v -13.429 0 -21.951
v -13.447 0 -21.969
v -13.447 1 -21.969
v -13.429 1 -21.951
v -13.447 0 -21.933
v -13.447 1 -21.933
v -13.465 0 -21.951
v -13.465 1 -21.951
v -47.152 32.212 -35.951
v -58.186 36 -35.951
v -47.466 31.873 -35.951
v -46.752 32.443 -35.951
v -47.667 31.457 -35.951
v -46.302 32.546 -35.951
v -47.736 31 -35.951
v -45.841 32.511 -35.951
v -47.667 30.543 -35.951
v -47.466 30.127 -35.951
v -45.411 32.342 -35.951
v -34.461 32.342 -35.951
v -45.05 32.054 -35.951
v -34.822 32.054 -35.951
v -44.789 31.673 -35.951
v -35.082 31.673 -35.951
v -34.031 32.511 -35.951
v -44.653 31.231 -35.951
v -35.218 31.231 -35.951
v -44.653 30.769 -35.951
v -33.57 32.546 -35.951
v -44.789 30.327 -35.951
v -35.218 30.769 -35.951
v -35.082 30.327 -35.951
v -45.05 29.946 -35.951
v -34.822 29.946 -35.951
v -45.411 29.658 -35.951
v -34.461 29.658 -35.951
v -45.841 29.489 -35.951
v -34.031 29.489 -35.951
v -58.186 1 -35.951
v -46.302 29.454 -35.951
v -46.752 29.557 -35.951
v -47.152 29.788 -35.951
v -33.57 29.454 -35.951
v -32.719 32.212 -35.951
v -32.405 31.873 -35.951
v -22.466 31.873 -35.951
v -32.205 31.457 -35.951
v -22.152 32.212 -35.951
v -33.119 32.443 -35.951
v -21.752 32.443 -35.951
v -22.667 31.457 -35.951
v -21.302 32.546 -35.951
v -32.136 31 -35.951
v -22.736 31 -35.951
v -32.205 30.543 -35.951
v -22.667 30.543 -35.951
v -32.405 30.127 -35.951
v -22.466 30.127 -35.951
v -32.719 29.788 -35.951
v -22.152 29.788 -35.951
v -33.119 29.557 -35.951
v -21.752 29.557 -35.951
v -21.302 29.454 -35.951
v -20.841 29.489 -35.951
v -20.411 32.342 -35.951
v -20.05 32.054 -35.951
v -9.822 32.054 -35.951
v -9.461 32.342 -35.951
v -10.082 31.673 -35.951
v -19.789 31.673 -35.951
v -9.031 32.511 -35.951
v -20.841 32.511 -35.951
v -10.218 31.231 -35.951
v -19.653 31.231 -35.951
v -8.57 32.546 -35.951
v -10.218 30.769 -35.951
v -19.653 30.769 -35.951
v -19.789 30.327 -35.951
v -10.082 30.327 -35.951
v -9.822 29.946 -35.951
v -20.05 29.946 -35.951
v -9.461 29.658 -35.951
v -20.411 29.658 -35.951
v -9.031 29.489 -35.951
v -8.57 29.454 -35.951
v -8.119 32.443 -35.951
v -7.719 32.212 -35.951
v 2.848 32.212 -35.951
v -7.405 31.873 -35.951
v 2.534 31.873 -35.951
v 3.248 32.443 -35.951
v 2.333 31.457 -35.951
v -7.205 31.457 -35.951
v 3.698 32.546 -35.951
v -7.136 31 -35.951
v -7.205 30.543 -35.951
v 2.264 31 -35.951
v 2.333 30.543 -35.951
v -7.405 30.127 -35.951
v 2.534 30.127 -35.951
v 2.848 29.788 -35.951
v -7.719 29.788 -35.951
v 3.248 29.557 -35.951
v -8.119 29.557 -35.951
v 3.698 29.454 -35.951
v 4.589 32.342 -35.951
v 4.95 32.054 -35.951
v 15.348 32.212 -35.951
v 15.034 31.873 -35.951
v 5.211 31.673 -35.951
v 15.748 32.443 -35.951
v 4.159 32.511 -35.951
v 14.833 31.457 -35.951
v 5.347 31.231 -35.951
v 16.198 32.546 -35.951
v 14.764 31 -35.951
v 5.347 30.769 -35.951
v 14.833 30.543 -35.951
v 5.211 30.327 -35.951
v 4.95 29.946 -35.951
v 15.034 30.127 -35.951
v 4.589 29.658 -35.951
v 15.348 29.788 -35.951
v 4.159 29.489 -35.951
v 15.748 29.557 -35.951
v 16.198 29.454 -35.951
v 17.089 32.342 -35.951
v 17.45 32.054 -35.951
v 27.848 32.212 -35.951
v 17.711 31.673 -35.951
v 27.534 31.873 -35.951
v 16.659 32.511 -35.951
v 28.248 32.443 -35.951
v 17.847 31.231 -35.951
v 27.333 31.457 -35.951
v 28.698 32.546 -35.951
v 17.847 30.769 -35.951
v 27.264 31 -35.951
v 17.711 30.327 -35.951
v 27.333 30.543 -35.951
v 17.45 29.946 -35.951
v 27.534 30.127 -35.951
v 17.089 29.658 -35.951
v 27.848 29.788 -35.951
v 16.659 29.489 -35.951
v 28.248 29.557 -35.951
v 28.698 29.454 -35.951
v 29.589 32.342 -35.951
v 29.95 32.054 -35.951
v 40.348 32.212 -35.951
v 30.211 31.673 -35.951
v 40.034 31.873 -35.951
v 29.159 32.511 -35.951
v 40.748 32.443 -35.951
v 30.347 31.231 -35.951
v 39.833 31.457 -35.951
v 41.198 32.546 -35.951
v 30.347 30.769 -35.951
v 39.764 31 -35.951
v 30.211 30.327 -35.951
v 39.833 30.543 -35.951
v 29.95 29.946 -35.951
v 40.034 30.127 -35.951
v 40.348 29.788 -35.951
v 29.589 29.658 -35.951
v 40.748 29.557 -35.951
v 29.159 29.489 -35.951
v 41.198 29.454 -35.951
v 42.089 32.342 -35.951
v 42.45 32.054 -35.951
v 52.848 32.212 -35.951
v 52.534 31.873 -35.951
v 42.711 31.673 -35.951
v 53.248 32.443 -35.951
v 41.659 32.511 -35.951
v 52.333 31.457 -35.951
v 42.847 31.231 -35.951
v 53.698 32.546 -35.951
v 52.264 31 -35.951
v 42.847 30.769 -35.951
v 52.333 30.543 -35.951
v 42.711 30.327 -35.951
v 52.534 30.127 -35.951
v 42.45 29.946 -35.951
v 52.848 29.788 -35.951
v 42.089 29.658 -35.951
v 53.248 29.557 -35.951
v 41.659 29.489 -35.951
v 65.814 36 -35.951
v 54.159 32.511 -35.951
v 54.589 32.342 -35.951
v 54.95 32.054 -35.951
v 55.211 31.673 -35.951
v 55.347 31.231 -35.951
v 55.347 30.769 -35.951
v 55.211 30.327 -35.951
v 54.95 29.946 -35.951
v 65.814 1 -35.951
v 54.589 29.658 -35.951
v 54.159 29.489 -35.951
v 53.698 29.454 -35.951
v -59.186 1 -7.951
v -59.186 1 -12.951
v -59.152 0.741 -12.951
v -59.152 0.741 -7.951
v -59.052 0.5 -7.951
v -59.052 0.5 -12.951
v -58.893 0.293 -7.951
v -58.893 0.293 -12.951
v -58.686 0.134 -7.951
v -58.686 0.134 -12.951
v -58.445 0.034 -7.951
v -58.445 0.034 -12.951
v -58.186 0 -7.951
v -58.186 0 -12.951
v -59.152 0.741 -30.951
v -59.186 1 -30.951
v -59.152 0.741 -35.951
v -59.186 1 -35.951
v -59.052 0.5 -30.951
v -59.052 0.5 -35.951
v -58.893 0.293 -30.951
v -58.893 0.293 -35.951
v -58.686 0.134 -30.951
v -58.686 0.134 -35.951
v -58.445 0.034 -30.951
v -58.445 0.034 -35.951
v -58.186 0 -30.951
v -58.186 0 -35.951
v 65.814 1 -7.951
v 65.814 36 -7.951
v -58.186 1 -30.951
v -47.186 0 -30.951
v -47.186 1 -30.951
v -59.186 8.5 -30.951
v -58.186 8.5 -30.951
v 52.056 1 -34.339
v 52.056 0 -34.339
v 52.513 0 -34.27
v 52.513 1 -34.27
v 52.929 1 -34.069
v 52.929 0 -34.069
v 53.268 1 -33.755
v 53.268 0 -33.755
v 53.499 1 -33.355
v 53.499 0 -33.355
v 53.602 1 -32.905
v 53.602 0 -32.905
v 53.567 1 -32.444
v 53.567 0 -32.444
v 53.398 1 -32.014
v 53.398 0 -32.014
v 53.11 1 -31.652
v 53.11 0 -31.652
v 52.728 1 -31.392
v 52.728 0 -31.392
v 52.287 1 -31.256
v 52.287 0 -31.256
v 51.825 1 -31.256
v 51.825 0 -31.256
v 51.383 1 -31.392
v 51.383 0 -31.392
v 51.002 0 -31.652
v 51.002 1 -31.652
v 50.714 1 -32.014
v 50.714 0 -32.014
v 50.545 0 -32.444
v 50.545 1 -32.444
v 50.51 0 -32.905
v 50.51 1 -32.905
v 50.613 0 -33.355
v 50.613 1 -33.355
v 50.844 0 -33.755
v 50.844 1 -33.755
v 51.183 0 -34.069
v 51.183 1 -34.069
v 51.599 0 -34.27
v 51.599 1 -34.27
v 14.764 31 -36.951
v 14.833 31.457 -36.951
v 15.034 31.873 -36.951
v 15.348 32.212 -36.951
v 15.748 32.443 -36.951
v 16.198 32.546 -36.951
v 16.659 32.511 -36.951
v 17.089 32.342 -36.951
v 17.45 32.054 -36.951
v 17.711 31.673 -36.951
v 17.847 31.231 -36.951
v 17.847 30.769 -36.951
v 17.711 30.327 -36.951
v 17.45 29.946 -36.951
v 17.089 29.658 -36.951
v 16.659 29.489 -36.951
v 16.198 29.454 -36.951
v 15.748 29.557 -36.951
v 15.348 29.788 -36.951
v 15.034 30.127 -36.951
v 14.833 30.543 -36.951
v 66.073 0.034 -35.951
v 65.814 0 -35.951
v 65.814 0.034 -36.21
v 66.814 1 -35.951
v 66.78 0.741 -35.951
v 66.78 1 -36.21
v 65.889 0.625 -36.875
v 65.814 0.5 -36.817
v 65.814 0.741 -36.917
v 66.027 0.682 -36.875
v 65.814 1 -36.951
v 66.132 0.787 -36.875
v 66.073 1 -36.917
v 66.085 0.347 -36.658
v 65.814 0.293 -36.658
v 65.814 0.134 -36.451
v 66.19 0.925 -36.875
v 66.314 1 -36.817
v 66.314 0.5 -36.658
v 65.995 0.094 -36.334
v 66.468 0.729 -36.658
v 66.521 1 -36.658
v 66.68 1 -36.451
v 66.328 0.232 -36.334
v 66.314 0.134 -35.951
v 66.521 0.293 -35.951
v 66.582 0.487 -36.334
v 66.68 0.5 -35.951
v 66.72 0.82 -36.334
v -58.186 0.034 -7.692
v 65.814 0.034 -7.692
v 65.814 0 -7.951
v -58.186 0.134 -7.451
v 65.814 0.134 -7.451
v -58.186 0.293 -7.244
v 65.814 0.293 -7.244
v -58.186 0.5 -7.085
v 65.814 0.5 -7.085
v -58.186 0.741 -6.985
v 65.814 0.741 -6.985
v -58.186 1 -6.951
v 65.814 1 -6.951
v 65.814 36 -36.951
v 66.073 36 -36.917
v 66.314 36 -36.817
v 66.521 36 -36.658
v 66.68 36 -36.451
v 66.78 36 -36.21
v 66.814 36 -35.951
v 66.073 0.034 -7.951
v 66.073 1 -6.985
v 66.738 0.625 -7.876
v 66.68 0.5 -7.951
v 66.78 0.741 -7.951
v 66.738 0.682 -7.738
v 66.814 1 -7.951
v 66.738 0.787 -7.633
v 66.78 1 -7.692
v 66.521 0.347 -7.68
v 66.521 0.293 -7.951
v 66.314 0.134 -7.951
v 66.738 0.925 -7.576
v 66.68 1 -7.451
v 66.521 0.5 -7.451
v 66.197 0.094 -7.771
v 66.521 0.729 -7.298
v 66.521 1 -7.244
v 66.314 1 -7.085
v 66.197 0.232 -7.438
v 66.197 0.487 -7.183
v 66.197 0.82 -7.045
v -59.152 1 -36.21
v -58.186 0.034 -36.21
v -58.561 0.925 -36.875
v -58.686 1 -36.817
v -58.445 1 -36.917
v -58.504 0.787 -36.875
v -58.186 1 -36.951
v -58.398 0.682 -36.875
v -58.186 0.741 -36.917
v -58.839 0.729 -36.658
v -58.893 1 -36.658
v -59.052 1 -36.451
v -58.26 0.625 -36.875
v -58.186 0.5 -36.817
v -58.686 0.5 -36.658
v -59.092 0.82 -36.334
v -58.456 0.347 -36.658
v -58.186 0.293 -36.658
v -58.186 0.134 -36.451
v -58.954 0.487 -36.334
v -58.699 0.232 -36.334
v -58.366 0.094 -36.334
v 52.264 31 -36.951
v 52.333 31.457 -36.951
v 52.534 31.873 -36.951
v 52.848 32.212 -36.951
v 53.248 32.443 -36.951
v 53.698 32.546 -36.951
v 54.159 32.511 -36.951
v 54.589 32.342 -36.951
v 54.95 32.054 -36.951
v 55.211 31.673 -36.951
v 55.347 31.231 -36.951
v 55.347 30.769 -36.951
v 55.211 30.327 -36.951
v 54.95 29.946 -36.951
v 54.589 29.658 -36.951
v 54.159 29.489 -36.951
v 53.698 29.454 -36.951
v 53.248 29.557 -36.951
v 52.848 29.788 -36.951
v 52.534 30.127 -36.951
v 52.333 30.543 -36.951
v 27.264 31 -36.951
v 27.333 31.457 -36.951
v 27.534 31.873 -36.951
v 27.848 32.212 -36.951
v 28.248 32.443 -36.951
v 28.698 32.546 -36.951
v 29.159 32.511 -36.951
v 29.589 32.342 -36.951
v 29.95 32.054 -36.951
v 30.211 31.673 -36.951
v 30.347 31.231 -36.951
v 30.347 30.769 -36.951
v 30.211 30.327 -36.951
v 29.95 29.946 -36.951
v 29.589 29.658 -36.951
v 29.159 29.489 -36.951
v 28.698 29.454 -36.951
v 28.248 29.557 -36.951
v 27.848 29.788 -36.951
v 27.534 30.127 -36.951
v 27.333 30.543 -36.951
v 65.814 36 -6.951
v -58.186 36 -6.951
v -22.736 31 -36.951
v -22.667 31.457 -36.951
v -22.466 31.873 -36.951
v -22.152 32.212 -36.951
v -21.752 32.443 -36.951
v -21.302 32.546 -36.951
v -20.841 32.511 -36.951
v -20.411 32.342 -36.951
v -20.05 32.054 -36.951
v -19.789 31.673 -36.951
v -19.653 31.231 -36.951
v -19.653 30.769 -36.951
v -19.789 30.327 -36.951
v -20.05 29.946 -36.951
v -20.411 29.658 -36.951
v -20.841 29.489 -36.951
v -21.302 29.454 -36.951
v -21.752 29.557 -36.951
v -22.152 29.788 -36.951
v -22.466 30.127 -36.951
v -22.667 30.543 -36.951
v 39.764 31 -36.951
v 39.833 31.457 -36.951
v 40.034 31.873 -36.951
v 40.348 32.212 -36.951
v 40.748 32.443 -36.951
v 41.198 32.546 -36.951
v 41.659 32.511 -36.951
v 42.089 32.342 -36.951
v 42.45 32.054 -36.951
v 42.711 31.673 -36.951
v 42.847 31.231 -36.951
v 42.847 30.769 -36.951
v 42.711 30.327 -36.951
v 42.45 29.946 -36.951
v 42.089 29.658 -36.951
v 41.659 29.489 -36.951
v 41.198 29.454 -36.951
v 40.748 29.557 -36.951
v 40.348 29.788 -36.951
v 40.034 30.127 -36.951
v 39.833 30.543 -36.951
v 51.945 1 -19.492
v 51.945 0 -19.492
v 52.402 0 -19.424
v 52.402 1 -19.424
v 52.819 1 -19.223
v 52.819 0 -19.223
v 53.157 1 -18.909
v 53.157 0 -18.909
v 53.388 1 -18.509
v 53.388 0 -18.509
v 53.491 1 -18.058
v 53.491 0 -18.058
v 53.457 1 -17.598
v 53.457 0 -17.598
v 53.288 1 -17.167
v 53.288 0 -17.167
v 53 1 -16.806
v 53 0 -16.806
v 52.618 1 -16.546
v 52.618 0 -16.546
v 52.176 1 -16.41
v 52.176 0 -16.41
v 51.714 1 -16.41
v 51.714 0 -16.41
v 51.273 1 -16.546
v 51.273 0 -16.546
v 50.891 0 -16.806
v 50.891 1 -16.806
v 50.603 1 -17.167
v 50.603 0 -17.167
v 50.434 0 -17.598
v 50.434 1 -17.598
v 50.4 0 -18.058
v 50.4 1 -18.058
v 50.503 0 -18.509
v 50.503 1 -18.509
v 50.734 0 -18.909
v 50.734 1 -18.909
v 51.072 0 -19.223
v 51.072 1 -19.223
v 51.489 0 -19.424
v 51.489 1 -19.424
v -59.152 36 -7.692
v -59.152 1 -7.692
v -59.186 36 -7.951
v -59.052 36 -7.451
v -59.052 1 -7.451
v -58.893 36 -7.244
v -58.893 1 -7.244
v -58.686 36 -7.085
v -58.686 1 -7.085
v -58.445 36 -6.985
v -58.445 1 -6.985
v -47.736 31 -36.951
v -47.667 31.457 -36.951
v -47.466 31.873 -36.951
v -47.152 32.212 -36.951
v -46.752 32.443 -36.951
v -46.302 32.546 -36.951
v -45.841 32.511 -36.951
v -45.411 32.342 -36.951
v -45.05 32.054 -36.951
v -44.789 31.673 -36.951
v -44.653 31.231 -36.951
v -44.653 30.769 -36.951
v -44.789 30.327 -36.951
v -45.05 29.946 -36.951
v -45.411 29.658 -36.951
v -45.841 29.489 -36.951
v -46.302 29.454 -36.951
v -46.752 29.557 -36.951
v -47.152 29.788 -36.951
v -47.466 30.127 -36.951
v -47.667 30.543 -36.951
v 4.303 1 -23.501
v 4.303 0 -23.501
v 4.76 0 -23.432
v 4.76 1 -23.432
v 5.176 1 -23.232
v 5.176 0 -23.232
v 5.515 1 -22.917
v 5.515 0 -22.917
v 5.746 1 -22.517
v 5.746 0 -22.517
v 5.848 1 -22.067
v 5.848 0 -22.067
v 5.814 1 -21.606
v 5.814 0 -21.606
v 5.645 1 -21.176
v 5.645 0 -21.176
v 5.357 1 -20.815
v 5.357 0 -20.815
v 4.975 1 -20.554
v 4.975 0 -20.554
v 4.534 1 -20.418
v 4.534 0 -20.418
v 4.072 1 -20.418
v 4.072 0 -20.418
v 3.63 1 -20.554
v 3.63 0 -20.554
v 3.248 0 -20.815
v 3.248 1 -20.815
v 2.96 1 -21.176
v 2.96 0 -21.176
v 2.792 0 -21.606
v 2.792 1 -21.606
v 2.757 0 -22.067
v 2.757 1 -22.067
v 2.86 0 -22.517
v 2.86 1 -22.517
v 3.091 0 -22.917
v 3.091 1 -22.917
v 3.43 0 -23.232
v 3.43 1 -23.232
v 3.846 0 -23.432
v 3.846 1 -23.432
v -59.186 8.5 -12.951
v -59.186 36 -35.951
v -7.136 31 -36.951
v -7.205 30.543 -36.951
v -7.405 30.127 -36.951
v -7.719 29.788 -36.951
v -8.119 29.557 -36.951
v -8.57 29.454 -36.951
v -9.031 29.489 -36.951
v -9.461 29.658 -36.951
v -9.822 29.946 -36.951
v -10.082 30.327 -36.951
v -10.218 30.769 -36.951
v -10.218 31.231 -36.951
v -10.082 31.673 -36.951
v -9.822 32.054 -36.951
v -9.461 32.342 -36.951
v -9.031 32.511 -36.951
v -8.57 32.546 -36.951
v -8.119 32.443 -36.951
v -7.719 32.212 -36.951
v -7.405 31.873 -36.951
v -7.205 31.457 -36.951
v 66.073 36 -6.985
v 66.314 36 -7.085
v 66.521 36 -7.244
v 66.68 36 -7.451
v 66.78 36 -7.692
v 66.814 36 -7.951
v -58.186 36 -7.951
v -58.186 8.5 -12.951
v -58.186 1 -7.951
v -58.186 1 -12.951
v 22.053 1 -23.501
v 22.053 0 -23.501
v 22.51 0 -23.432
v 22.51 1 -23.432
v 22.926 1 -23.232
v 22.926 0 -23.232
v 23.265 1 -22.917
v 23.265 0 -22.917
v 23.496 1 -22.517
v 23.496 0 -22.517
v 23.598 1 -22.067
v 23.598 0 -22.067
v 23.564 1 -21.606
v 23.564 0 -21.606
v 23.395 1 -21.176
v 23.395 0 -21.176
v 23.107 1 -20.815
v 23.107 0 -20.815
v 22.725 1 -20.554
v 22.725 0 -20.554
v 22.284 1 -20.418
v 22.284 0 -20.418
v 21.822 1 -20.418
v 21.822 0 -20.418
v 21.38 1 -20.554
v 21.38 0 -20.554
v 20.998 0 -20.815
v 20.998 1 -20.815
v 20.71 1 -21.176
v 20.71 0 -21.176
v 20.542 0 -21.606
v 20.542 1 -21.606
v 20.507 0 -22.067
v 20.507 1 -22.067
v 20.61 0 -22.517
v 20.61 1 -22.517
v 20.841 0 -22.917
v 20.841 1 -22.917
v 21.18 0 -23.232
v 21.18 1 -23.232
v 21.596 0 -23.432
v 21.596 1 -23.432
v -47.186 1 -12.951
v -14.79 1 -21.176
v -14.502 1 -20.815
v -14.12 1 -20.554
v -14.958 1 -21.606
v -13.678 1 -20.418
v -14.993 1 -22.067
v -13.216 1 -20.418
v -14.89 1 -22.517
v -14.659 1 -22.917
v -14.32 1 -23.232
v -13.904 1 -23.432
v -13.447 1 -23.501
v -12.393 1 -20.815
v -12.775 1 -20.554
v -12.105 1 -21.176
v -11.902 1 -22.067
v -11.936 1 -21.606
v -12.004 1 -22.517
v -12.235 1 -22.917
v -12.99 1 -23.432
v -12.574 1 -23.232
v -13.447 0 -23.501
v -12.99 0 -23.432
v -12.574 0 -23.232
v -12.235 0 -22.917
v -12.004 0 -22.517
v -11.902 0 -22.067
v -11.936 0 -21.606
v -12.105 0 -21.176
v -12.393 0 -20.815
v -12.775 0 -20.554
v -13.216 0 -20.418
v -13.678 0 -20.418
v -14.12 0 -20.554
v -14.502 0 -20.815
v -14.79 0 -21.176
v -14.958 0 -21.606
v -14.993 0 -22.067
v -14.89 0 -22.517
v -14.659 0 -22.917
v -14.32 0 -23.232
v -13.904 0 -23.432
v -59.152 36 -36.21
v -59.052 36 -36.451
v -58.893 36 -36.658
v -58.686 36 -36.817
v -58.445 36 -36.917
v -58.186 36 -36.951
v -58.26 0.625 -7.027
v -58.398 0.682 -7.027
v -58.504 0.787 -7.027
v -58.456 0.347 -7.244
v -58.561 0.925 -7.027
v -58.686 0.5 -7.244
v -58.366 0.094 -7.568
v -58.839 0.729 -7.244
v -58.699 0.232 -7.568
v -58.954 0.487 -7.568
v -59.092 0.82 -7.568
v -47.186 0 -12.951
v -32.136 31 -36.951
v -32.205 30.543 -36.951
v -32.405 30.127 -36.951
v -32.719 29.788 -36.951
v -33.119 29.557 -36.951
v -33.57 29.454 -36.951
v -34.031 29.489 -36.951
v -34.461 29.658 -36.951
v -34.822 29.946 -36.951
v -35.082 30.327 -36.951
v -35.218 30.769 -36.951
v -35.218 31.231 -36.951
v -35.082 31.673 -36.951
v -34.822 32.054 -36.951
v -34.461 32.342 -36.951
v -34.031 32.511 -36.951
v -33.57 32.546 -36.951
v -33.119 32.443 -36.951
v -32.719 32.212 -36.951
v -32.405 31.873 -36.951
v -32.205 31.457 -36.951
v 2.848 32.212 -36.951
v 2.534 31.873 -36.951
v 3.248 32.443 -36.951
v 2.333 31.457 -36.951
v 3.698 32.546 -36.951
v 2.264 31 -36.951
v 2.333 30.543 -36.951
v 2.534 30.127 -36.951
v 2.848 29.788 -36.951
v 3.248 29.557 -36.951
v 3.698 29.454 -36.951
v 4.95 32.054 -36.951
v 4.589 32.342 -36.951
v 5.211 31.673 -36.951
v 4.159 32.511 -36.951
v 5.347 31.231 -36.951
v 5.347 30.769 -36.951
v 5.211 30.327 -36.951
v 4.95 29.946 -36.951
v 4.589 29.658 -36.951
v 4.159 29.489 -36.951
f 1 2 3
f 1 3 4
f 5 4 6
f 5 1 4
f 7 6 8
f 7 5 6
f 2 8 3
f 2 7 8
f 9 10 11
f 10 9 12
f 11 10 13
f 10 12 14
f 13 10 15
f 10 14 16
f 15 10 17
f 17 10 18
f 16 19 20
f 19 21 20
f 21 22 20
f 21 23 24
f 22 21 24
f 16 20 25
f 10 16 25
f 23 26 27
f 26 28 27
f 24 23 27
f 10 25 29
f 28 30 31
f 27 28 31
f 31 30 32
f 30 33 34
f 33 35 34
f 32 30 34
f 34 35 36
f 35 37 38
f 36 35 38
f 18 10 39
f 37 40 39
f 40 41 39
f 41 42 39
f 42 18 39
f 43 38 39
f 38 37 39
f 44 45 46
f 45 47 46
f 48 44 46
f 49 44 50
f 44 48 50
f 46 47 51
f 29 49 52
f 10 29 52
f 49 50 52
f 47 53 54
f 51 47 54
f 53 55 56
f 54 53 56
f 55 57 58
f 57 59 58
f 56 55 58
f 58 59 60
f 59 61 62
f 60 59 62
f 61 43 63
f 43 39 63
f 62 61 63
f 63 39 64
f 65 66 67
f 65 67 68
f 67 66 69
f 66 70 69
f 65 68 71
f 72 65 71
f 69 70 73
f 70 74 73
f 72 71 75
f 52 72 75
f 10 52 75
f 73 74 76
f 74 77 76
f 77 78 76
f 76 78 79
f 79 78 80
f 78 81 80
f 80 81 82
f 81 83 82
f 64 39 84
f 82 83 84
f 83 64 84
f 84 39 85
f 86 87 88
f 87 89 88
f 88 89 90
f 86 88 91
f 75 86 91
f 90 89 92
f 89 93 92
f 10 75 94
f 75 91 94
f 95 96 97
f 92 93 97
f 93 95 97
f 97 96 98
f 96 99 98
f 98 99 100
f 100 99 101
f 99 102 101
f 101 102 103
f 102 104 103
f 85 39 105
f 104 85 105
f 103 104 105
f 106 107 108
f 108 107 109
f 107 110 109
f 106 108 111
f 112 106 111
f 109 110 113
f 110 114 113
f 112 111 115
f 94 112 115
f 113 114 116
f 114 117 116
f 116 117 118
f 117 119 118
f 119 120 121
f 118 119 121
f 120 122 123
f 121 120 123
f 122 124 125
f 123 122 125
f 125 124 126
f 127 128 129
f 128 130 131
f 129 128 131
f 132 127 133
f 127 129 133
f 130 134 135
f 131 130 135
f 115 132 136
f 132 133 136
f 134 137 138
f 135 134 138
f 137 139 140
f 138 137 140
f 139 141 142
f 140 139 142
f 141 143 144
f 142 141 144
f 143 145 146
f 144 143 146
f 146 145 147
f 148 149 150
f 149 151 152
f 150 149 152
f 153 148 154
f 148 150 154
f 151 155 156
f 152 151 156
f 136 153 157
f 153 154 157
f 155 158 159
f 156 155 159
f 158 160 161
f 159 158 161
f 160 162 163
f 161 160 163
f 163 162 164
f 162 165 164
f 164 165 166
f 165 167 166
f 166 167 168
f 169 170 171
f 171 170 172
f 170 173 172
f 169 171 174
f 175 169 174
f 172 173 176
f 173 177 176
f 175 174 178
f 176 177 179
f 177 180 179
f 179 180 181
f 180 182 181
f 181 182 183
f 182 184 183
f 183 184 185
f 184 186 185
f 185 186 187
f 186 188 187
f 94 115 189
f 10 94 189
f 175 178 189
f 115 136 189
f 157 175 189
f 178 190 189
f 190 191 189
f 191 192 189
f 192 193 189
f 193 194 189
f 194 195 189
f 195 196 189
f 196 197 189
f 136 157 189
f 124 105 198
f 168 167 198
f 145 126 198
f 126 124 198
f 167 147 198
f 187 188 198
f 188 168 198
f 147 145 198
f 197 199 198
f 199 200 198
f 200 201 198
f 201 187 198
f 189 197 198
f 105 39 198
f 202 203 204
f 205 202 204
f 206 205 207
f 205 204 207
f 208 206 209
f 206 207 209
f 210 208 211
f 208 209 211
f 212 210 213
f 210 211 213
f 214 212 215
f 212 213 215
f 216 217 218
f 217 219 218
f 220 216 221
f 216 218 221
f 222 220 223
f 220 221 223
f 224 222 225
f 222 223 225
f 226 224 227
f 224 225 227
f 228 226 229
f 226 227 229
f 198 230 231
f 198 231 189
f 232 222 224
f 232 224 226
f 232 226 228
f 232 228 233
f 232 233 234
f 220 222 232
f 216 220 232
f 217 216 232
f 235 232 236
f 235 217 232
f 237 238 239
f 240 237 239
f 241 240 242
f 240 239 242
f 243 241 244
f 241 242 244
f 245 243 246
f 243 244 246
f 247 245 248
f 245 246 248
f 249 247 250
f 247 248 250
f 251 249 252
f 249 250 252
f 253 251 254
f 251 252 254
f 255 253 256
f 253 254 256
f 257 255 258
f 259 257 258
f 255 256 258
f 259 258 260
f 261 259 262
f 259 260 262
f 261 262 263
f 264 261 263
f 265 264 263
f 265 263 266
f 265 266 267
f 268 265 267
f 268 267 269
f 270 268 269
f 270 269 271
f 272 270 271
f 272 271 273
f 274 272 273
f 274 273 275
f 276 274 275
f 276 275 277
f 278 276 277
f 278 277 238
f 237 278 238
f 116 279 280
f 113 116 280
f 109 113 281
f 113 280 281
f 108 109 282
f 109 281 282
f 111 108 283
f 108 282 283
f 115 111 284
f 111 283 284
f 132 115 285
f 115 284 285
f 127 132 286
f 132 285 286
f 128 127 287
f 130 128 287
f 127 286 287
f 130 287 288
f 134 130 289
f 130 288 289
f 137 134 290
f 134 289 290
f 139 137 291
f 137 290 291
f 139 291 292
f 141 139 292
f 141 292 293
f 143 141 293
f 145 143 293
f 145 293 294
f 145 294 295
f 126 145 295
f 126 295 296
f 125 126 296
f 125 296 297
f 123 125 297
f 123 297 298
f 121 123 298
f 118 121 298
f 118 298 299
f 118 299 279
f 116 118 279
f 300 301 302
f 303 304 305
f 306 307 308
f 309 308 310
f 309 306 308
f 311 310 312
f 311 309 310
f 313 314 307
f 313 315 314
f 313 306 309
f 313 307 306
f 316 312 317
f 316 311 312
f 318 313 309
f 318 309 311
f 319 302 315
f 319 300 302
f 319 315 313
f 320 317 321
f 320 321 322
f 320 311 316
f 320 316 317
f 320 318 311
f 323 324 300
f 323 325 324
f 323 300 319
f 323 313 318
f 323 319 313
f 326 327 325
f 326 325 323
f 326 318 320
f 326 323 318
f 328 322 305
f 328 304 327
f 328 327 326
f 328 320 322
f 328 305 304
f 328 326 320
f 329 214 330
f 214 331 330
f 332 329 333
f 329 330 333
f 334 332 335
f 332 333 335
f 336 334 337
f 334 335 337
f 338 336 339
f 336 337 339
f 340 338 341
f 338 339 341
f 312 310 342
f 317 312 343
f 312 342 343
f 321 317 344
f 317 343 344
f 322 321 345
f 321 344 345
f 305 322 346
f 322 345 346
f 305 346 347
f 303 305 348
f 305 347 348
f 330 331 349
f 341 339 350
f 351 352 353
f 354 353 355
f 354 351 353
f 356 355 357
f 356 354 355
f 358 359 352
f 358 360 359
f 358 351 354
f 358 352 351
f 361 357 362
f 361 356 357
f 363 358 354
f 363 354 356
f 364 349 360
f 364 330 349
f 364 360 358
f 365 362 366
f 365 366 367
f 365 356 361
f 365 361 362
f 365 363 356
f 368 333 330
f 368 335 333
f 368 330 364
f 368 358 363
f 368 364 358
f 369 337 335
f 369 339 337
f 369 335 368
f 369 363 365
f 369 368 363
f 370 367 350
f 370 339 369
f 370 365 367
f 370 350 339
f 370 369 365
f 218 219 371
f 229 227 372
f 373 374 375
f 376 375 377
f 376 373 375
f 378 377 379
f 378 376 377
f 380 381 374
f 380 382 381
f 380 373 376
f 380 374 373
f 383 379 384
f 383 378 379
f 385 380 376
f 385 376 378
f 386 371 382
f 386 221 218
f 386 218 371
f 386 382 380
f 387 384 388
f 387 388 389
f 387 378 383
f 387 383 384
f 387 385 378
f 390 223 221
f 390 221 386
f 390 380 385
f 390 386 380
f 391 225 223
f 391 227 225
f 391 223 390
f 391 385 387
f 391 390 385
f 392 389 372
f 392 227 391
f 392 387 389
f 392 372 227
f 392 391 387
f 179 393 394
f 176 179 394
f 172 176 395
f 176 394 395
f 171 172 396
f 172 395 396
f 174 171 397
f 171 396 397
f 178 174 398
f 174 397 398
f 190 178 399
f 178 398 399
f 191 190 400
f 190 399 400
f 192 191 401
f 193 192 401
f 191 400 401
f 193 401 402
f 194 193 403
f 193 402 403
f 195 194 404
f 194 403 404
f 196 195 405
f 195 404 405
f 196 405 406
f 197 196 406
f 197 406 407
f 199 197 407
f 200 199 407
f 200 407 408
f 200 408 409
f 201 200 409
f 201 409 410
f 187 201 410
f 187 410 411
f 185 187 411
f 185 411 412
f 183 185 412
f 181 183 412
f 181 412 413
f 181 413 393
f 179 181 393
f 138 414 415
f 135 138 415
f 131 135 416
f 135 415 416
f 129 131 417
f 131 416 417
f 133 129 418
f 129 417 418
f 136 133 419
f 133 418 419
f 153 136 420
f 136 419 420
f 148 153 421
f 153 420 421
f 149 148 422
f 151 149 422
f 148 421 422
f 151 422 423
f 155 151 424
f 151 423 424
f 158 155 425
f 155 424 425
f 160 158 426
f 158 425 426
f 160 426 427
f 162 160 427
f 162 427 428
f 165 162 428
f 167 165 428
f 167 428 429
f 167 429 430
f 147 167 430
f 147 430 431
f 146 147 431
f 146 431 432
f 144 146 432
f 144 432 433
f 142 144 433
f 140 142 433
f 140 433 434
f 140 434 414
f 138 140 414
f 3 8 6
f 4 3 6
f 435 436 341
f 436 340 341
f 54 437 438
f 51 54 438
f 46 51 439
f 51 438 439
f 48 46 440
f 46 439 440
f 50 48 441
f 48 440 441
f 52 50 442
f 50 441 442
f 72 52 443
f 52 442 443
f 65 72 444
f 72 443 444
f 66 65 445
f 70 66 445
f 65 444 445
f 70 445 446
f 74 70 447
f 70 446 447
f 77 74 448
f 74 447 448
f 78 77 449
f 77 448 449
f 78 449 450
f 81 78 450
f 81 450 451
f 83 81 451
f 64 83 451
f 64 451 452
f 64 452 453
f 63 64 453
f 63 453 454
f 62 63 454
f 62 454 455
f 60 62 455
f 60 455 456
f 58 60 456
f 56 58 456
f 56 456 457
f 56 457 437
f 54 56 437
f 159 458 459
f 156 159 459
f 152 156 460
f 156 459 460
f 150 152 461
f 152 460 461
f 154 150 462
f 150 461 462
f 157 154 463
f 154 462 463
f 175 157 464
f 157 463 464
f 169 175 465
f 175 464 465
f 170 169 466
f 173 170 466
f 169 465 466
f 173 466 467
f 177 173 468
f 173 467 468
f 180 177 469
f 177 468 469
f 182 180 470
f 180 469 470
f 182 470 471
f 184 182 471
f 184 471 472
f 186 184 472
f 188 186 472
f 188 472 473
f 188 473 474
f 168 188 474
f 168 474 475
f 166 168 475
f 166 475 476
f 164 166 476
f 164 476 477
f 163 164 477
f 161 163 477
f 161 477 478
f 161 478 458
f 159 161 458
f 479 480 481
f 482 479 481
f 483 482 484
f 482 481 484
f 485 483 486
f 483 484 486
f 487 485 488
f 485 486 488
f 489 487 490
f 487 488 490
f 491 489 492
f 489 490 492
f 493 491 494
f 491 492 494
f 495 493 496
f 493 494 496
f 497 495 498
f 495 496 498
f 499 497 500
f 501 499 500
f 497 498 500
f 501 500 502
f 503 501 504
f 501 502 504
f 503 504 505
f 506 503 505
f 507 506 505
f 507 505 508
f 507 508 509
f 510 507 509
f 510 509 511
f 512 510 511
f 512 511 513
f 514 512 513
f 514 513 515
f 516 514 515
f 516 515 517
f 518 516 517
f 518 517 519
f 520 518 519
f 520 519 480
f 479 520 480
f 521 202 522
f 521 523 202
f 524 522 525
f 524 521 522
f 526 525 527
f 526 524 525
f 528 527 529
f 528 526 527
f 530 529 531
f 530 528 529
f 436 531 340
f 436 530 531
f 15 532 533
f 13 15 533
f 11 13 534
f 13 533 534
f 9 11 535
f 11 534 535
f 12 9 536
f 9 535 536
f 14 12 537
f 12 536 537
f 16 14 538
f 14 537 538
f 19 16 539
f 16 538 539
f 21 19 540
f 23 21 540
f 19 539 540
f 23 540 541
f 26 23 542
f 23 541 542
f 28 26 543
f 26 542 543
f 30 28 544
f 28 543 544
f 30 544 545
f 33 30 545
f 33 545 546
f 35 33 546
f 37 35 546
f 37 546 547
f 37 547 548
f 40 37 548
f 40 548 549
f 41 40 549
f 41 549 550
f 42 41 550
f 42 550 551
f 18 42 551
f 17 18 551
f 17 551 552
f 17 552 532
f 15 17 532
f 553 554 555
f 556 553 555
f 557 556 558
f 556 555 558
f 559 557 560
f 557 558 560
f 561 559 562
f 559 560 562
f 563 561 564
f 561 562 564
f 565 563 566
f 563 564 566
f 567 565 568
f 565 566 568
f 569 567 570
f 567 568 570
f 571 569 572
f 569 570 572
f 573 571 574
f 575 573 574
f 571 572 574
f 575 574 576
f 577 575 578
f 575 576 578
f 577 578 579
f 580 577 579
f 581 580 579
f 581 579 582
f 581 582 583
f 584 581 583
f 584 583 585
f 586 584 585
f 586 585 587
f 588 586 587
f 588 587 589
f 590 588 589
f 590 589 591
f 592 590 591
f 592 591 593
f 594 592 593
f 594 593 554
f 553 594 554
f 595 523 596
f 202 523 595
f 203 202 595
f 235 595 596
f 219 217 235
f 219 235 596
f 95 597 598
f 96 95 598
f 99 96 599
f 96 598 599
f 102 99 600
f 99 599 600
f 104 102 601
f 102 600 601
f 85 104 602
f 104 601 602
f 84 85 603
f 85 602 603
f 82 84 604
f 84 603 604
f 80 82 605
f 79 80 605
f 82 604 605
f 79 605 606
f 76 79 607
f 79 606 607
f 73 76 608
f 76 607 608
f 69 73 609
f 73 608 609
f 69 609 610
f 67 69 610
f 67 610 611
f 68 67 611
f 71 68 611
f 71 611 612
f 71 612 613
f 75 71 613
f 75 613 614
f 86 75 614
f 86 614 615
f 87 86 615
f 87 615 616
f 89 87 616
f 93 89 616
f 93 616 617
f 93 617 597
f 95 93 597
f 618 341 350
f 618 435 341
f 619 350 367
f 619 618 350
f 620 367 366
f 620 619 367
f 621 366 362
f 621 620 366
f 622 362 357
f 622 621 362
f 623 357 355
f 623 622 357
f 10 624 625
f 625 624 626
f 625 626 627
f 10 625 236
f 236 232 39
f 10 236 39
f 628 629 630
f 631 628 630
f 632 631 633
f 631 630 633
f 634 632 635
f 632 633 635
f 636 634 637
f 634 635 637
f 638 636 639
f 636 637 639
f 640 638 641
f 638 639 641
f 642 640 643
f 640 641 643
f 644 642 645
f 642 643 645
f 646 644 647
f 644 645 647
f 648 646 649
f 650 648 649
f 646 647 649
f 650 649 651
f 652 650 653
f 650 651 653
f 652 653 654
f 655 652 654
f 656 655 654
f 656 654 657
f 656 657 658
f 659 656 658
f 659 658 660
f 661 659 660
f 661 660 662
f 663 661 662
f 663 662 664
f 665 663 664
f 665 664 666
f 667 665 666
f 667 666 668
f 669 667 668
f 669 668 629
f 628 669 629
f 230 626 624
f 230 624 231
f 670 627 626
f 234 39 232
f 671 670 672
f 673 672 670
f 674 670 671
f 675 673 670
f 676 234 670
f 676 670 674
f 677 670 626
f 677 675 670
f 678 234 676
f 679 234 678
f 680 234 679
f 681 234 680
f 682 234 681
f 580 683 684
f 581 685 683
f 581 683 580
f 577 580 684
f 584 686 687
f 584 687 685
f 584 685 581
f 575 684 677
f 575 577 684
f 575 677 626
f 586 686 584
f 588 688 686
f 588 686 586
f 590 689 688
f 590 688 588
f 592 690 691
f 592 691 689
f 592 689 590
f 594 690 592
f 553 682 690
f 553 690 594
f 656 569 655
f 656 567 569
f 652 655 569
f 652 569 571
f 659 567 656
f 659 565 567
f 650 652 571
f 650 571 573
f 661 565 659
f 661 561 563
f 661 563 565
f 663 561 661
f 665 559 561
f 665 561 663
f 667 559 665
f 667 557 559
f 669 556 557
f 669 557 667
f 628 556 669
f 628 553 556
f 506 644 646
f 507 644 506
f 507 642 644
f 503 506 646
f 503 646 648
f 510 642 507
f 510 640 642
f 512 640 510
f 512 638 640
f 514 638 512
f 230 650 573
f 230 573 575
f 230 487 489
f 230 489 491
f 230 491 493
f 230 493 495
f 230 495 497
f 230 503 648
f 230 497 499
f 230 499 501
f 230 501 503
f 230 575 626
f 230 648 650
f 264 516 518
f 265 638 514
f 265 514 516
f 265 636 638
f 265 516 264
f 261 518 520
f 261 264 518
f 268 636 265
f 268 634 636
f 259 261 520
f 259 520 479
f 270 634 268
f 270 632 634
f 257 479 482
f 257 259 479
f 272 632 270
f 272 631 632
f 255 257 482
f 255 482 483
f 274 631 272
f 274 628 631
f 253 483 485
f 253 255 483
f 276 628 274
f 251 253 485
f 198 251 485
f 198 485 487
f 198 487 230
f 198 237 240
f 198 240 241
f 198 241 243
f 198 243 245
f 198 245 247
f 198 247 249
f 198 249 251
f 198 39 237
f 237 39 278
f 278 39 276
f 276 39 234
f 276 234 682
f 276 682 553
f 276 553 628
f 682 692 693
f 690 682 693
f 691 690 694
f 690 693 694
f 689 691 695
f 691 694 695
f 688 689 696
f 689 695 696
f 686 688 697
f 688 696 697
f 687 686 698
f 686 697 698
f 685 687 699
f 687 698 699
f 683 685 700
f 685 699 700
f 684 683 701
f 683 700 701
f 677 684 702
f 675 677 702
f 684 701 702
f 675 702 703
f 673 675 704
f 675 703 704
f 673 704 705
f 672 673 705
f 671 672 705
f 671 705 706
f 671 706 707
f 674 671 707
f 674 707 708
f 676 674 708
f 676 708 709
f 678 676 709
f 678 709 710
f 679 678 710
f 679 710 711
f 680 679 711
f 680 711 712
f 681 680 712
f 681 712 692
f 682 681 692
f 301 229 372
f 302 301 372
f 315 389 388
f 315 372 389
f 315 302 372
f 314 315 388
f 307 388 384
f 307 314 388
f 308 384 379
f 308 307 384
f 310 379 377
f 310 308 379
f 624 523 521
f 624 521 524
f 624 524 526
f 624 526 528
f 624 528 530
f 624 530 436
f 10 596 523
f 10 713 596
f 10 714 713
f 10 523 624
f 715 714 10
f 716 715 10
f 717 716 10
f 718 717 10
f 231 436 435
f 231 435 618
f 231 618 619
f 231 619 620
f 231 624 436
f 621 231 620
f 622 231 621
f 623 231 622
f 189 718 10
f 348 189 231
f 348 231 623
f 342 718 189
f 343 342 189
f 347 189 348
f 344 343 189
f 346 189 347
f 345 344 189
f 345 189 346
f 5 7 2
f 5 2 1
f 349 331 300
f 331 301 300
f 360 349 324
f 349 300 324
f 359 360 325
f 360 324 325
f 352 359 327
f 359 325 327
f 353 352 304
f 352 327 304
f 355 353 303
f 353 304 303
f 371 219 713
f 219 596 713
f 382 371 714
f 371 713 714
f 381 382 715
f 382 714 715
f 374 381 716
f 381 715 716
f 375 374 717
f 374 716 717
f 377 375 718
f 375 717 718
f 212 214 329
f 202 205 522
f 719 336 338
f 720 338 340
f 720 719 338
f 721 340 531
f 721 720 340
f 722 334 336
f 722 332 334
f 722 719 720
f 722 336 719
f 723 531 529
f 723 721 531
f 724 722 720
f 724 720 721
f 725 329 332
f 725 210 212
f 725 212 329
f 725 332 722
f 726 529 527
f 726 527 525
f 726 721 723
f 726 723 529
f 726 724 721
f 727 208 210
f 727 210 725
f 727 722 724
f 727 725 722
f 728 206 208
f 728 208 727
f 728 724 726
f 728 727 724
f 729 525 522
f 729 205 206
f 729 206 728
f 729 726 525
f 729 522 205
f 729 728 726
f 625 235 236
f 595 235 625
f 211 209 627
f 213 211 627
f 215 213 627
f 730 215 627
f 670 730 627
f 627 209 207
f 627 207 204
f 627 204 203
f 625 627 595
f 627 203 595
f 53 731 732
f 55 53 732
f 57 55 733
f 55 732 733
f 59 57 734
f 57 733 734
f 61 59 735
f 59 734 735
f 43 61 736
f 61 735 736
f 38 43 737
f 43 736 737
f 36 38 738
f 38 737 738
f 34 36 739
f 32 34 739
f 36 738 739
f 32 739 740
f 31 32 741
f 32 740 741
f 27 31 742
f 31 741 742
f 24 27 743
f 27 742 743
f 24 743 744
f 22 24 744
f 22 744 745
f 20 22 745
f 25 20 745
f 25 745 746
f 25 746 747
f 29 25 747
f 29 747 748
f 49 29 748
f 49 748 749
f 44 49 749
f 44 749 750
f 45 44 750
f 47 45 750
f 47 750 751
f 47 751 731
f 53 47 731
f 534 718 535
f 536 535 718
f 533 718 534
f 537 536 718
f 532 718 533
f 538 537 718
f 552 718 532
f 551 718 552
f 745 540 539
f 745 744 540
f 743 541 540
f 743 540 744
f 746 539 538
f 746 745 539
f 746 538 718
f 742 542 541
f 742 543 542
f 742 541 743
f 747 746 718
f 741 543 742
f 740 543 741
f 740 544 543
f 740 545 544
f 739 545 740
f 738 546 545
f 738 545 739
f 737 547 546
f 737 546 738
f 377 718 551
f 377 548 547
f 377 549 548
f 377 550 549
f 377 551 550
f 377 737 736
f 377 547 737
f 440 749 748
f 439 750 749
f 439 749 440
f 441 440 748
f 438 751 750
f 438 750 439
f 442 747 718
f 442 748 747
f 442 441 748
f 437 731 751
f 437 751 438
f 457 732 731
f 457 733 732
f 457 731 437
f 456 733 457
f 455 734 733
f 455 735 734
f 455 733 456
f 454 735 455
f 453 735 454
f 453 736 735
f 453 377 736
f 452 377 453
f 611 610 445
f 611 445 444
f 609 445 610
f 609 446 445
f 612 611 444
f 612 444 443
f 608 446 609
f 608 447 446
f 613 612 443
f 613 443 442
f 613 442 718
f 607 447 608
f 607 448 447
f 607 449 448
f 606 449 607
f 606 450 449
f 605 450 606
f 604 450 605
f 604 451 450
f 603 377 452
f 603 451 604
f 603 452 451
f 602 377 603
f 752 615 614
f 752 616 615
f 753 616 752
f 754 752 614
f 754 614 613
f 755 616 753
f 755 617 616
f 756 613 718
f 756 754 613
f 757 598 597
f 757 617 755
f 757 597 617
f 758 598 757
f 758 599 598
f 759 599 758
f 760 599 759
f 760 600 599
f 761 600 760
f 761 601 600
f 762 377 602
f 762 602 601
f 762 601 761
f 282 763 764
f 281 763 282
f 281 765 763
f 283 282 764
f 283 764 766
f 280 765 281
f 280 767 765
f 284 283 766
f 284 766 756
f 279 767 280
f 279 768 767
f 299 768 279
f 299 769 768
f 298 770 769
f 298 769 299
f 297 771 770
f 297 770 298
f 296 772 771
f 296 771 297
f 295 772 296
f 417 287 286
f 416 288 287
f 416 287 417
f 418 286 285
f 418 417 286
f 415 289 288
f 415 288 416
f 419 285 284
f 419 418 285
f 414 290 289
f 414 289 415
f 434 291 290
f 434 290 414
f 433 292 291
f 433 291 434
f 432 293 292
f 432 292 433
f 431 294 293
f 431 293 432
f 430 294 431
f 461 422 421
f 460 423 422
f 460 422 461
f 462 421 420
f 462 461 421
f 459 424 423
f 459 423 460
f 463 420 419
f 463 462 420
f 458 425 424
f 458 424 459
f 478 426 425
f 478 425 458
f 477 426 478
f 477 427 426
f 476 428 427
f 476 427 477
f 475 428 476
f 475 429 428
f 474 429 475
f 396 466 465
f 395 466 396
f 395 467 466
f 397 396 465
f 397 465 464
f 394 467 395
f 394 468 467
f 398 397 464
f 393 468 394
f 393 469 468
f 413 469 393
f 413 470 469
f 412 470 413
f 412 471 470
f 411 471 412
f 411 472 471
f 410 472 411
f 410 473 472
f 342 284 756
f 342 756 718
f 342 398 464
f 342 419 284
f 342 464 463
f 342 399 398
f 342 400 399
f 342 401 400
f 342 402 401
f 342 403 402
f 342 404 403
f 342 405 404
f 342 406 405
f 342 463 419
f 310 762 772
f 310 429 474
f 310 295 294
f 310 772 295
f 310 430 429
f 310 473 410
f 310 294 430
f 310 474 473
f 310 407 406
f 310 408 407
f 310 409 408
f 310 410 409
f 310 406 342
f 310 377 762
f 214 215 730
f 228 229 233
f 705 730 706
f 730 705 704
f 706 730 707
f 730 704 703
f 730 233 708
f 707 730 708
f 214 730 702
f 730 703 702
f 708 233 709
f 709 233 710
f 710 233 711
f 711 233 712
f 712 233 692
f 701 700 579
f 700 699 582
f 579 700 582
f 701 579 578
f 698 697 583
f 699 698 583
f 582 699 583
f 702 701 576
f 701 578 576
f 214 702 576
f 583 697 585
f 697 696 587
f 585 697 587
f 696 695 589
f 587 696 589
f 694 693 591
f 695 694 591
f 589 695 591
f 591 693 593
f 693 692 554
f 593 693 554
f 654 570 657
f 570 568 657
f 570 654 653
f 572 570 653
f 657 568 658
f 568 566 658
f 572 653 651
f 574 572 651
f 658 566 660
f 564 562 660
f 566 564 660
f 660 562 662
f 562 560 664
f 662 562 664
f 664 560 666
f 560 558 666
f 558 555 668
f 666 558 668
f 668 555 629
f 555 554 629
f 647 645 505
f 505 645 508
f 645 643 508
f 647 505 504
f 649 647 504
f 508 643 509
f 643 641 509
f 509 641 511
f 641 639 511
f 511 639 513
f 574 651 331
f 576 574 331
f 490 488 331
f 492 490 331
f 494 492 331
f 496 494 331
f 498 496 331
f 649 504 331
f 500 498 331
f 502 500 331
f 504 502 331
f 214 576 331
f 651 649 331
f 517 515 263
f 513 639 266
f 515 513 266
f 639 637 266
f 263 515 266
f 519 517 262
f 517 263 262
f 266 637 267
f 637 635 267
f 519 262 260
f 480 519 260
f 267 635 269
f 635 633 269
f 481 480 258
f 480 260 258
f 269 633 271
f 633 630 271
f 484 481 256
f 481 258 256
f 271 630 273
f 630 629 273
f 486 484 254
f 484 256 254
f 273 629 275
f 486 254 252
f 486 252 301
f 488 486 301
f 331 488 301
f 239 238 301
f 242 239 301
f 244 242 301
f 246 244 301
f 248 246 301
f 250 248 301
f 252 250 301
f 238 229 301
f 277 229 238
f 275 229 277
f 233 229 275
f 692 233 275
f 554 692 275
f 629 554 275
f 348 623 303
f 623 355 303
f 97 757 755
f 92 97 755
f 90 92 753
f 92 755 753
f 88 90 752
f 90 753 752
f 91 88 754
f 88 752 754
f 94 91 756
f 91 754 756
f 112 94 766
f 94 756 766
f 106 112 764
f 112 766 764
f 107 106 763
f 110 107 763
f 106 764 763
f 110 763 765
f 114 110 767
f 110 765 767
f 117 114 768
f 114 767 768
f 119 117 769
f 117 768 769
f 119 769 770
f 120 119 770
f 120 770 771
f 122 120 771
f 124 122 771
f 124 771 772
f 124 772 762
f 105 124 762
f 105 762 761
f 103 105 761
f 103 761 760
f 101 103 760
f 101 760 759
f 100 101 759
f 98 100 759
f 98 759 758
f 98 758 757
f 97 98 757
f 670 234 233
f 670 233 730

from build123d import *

# Parameters (mm, degrees)
SKETCH_1_W          = 126
SKETCH_1_H          = 30
EXTRUDE_1_DEPTH     = 36
SHELL_1_T           = -1
SKETCH_2_W          = 18
SKETCH_2_H          = 8.5
CUT_EXTRUDE_1_DEPTH = 12
SKETCH_4_R          = 1.55
SKETCH_4_R_2        = 0.018181818
CUT_EXTRUDE_2_DEPTH = 12
FILLET_1_R          = 1
SKETCH_5_R          = 1.55
CUT_EXTRUDE_3_DEPTH = 10


with BuildPart() as part:
    # 草图1 → 凸台-拉伸1 (new body)
    with BuildSketch(Plane(origin=(0, 0, 0), x_dir=(1, 0, 0), z_dir=(0, 1, 0))):
        with Locations((3.814267375, 21.950874785)):
            Rectangle(SKETCH_1_W, SKETCH_1_H)
    extrude(amount=EXTRUDE_1_DEPTH)

    # 抽壳1
    shell_1_openings = [part.faces().sort_by_distance(p)[0] for p in [
        (3.814267375, 36, -21.950874785),
    ]]
    offset(amount=SHELL_1_T, openings=shell_1_openings, kind=Kind.INTERSECTION)

    # 草图2 → 切除-拉伸1 (cut)
    with BuildSketch(Plane.ZY.offset(59.185732625)):
        with Locations((-21.950874785, 4.25)):
            Rectangle(SKETCH_2_W, SKETCH_2_H)
    extrude(amount=-CUT_EXTRUDE_1_DEPTH, mode=Mode.SUBTRACT)

    # 草图4 → 切除-拉伸2 (cut)
    # profile 1 of 5: a face of its own
    with BuildSketch(Plane.XZ):
        with Locations(Location((-13.447304323, -21.950874785, 0), (0, 0, 270))):
            Circle(SKETCH_4_R)
        with Locations(Location((-13.447304323, -21.950874785, 0), (0, 0, 270))):
            Circle(SKETCH_4_R_2, mode=Mode.SUBTRACT)
    # profile 2 of 5: a face of its own
    with BuildSketch(Plane.XZ):
        with Locations(Location((4.302695677, -21.950874785, 0), (0, 0, 270))):
            Circle(SKETCH_4_R)
    # profile 3 of 5: a face of its own
    with BuildSketch(Plane.XZ):
        with Locations(Location((22.052695677, -21.950874785, 0), (0, 0, 270))):
            Circle(SKETCH_4_R)
    # profile 4 of 5: a face of its own
    with BuildSketch(Plane.XZ):
        with Locations(Location((51.945468235, -17.942457274, 0), (0, 0, 270))):
            Circle(SKETCH_4_R)
    # profile 5 of 5: a face of its own
    with BuildSketch(Plane.XZ):
        with Locations(Location((52.0558492, -32.788697079, 0), (0, 0, 270))):
            Circle(SKETCH_4_R)
    extrude(amount=-CUT_EXTRUDE_2_DEPTH, mode=Mode.SUBTRACT)


with BuildPart() as cut_extrude_2_piece_1:
    # of the separate pieces the step leaves, piece 1, a body of its own (cut_extrude_2_pieces)
    add(part.part.solids().sort_by_distance((-59.185732625, 0, -36.950874785))[0])

    # 圆角1
    fillet_1_edges = [cut_extrude_2_piece_1.edges().sort_by_distance(p)[0] for p in [
        (-59.185732625, 0, -33.950874785),
        (-59.185732625, 0, -9.950874785),
        (-59.185732625, 18, -36.950874785),
        (3.814267375, 0, -6.950874785),
        (-59.185732625, 18, -6.950874785),
        (66.814267375, 0, -21.950874785),
        (66.814267375, 18, -6.950874785),
        (3.814267375, 0, -36.950874785),
        (66.814267375, 18, -36.950874785),
    ]]
    fillet(fillet_1_edges, radius=FILLET_1_R)

    # 草图5 → 切除-拉伸3 (cut)
    with BuildSketch(Plane(origin=(0, 0, -36.950874785), x_dir=(-1, 0, 0), z_dir=(0, 0, -1))):
        with Locations((-28.814267375, 31)):
            Circle(SKETCH_5_R)
        with Locations((-53.814267375, 31)):
            Circle(SKETCH_5_R)
        with Locations((-3.814267375, 31)):
            Circle(SKETCH_5_R)
        with Locations((21.185732625, 31)):
            Circle(SKETCH_5_R)
        with Locations((46.185732625, 31)):
            Circle(SKETCH_5_R)
        with Locations((-41.314267375, 31)):
            Circle(SKETCH_5_R)
        with Locations((-16.314267375, 31)):
            Circle(SKETCH_5_R)
        with Locations(Location((8.685732625, 31, 0), (0, 0, 180))):
            Circle(SKETCH_5_R)
        with Locations(Location((33.685732625, 31, 0), (0, 0, 180))):
            Circle(SKETCH_5_R)
    extrude(amount=-CUT_EXTRUDE_3_DEPTH, mode=Mode.SUBTRACT)


with BuildPart() as cut_extrude_2_piece_2:
    # of the separate pieces the step leaves, piece 2, a body of its own (cut_extrude_2_pieces)
    add(part.part.solids().sort_by_distance((-13.447304323, 0, -21.969056603))[0])


solid = Compound([cut_extrude_2_piece_1.part, cut_extrude_2_piece_2.part])
